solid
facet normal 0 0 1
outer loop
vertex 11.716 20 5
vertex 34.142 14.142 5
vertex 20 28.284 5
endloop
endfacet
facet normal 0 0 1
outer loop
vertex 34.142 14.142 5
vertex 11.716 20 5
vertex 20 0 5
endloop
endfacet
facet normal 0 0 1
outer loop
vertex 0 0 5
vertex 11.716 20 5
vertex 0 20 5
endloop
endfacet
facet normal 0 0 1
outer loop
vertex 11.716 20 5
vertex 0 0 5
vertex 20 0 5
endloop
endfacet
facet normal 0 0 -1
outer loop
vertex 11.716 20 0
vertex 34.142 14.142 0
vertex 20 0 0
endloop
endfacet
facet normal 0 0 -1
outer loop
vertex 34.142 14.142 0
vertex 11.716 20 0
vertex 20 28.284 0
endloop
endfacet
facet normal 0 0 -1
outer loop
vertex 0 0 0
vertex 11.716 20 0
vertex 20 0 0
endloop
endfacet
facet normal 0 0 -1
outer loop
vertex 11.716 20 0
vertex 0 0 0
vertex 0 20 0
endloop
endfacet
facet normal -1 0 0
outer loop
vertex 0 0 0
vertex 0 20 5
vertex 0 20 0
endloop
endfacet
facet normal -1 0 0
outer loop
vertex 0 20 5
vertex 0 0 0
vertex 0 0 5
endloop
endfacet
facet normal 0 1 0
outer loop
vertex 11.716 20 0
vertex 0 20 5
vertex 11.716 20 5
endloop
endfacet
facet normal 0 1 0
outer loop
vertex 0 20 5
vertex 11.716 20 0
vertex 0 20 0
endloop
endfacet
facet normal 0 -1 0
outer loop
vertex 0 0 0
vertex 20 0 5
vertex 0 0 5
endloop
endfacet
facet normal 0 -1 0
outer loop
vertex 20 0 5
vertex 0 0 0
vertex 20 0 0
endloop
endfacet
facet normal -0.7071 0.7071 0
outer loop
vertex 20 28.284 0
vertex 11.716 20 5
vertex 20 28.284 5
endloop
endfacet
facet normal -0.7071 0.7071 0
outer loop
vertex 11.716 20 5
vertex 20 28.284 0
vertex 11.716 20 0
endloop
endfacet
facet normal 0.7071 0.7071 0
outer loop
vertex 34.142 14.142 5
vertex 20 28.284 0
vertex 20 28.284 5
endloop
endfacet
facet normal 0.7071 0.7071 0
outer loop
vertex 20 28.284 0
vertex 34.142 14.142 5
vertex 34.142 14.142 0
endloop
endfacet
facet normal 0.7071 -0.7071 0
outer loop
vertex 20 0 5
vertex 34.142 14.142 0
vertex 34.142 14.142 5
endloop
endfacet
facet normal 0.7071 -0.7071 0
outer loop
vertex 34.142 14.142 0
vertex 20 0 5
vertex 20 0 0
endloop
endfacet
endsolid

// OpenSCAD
//
// First example for testing a dual extrusion.
// 5/22/12	Initial Creation		-jkl
//


module block() {
	translate([0, 0, 0]) cube([20,20,5]);
}

difference()
{
	block();
	translate([20,0,0]) rotate([0,0,45]) block();
} 
color("red")
translate([20,0,0]) rotate([0,0,45]) block();
